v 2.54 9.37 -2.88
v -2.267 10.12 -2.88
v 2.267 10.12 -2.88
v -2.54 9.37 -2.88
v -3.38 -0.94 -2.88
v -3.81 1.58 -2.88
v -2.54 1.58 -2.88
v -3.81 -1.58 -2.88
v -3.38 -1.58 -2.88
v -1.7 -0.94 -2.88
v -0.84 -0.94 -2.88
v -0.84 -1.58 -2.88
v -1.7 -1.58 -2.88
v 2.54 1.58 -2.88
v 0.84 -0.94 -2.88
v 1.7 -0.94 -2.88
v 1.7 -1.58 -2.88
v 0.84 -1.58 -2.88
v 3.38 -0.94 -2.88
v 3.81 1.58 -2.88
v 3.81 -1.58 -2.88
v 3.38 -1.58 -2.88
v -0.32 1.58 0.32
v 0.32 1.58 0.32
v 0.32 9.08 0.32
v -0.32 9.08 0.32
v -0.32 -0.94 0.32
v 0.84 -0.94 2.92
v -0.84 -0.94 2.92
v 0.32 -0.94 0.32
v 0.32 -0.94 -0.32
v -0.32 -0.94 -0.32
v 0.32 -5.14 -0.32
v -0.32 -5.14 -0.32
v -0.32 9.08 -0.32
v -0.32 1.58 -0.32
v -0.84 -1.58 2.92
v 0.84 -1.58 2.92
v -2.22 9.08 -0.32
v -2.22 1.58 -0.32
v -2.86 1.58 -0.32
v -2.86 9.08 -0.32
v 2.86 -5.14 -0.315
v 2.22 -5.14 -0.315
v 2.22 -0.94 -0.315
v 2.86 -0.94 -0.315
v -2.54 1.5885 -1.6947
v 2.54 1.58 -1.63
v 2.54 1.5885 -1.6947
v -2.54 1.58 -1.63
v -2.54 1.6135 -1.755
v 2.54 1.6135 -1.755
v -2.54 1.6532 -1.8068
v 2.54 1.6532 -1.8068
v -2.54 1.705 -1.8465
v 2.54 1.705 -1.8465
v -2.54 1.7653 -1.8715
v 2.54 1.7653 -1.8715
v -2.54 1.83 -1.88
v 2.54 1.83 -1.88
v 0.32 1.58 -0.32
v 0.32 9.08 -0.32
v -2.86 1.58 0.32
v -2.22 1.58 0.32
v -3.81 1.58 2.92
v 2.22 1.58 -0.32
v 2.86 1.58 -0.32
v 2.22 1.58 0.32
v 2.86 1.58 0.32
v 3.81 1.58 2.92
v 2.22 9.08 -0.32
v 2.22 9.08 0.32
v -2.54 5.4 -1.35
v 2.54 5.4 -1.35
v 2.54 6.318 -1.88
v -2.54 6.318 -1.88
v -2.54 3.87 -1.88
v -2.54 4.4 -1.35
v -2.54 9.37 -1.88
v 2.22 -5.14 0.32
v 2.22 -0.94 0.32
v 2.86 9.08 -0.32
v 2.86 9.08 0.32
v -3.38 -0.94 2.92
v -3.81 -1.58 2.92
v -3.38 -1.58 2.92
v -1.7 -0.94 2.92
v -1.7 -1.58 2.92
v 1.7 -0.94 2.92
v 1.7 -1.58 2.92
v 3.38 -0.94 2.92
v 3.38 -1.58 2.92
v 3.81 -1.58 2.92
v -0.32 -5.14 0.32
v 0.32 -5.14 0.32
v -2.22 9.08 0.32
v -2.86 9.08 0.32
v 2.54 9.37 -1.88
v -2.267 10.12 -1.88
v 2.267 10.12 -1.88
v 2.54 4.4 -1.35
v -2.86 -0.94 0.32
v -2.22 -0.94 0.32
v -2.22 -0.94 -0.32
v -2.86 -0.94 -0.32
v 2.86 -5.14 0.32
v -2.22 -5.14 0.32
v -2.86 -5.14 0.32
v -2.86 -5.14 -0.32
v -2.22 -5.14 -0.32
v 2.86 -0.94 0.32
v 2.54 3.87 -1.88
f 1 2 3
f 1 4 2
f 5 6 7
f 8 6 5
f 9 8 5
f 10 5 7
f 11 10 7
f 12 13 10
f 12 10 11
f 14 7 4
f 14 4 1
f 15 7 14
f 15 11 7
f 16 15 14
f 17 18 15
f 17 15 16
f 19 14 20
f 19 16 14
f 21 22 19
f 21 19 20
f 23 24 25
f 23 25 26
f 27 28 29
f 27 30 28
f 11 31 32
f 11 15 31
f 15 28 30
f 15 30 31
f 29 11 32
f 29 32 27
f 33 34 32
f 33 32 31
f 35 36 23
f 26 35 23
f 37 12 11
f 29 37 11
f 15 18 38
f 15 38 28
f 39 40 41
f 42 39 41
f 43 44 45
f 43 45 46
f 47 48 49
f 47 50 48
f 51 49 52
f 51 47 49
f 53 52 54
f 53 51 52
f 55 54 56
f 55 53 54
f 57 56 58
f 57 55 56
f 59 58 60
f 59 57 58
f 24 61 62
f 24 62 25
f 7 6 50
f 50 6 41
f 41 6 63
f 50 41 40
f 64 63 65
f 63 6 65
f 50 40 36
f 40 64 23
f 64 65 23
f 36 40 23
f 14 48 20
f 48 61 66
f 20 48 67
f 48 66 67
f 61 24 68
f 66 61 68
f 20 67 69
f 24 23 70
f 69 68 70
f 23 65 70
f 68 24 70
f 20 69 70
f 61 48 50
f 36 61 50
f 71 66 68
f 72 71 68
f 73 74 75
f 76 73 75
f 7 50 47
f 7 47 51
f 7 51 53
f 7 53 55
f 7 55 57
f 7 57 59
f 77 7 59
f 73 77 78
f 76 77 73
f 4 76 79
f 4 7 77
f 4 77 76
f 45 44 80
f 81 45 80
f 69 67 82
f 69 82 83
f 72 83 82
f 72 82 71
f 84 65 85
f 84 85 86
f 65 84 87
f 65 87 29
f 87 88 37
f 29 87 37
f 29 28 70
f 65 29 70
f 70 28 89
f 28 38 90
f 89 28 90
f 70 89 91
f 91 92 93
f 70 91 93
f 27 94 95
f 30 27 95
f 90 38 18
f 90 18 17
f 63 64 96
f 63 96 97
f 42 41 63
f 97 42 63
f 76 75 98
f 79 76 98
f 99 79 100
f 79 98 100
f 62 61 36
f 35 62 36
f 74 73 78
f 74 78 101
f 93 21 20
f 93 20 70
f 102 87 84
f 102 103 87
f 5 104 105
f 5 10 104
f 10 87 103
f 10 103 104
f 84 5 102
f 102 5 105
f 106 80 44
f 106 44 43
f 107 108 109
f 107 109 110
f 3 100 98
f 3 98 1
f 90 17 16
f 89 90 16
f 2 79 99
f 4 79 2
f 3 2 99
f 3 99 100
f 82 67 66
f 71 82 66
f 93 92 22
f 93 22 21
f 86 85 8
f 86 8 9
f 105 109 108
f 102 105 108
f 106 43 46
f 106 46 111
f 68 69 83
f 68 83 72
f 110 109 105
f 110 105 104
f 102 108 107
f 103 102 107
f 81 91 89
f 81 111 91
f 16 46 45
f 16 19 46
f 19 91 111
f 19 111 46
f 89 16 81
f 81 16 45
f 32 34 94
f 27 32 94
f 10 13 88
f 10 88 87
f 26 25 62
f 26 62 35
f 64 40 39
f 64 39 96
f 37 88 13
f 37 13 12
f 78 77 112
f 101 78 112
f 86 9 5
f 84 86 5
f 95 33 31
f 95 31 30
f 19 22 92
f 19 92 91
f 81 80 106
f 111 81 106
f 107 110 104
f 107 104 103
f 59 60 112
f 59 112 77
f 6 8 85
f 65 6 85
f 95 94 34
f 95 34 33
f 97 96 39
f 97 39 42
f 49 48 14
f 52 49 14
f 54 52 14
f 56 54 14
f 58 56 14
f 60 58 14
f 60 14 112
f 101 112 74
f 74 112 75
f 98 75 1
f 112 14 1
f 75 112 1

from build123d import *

# Parameters (mm, degrees)
SKETCH1_W           = 7.62
SKETCH1_H           = 5.8
BOSS_EXTRUDE1_DEPTH = 3.16
SKETCH2_W           = 5.08
SKETCH2_H           = 1
BOSS_EXTRUDE2_DEPTH = 8.54
SKETCH3_W           = 5.08
SKETCH3_H           = 6.25
BOSS_EXTRUDE3_DEPTH = 0.53
SKETCH4_W           = 1.68
SKETCH4_H           = 0.64
CUT_EXTRUDE1_DEPTH  = 13.270717175
SKETCH5_W           = 1.68
SKETCH5_H           = 0.64
CUT_EXTRUDE2_DEPTH  = 13.270717175
SKETCH6_W           = 0.53
SKETCH6_H           = 3.802013072
CUT_EXTRUDE3_DEPTH  = 13.298914586
SKETCH7_W           = 1.68
SKETCH7_H           = 0.64
CUT_EXTRUDE4_DEPTH  = 13.270717175
SKETCH8_W           = 0.64
SKETCH8_H           = 0.64
BOSS_EXTRUDE4_DEPTH = 4.2
SKETCH9_W           = 0.64
SKETCH9_H           = 0.64
BOSS_EXTRUDE5_DEPTH = 4.2
SKETCH10_W          = 0.64
SKETCH10_H          = 0.635
BOSS_EXTRUDE6_DEPTH = 4.2
SKETCH11_W          = 0.64
SKETCH11_H          = 0.64
BOSS_EXTRUDE7_DEPTH = 7.5
SKETCH12_W          = 0.64
SKETCH12_H          = 0.64
BOSS_EXTRUDE8_DEPTH = 7.5
SKETCH13_W          = 0.64
SKETCH13_H          = 0.64
BOSS_EXTRUDE9_DEPTH = 7.5
DRAFT1_ANGLE        = 45
DRAFT2_ANGLE        = 60
CHAMFER1_SIZE       = 0.75
CHAMFER1_SIZE2      = 0.272977676
CHAMFER2_SIZE       = 0.272977676
CHAMFER2_SIZE2      = 0.75
FILLET1_R           = 0.25


with BuildPart() as part:
    # Sketch1 → Boss-Extrude1 (new body)
    with BuildSketch(Plane.XZ.offset(1.58)):
        with Locations((0, 0.02)):
            Rectangle(SKETCH1_W, SKETCH1_H)
    extrude(amount=-BOSS_EXTRUDE1_DEPTH)

    # Sketch2 → Boss-Extrude2 (add)
    with BuildSketch(Plane(origin=(0, 1.58, 0), x_dir=(-1, 0, 0), z_dir=(0, 1, 0))):
        with Locations((0, -2.38)):
            Rectangle(SKETCH2_W, SKETCH2_H)
    extrude(amount=BOSS_EXTRUDE2_DEPTH)

    # Sketch3 → Boss-Extrude3 (add)
    with BuildSketch(Plane.XY.offset(-1.88)):
        with Locations((0, 6.995)):
            Rectangle(SKETCH3_W, SKETCH3_H)
    extrude(amount=BOSS_EXTRUDE3_DEPTH)

    # Sketch4 → Cut-Extrude1 (cut, through all)
    with BuildSketch(Plane(origin=(0, 0, -2.88), x_dir=(-1, 0, 0), z_dir=(0, 0, -1))):
        with Locations((2.54, -1.26)):
            Rectangle(SKETCH4_W, SKETCH4_H)
    extrude(amount=-CUT_EXTRUDE1_DEPTH, mode=Mode.SUBTRACT)

    # Sketch5 → Cut-Extrude2 (cut, through all)
    with BuildSketch(Plane(origin=(0, 0, -2.88), x_dir=(-1, 0, 0), z_dir=(0, 0, -1))):
        with Locations((0, -1.26)):
            Rectangle(SKETCH5_W, SKETCH5_H)
    extrude(amount=-CUT_EXTRUDE2_DEPTH, mode=Mode.SUBTRACT)

    # Sketch6 → Cut-Extrude3 (cut, through all)
    with BuildSketch(Plane(origin=(2.54, 0, 0), x_dir=(0, 0, -1), z_dir=(1, 0, 0))):
        with Locations((1.615, 8.218993464)):
            Rectangle(SKETCH6_W, SKETCH6_H)
    extrude(amount=-CUT_EXTRUDE3_DEPTH, mode=Mode.SUBTRACT)

    # Sketch7 → Cut-Extrude4 (cut, through all)
    with BuildSketch(Plane(origin=(0, 0, -2.88), x_dir=(-1, 0, 0), z_dir=(0, 0, -1))):
        with Locations((-2.54, -1.26)):
            Rectangle(SKETCH7_W, SKETCH7_H)
    extrude(amount=-CUT_EXTRUDE4_DEPTH, mode=Mode.SUBTRACT)

    # Sketch8 → Boss-Extrude4 (add)
    with BuildSketch(Plane.XZ.offset(0.94)):
        Rectangle(SKETCH8_W, SKETCH8_H)
    extrude(amount=BOSS_EXTRUDE4_DEPTH)

    # Sketch9 → Boss-Extrude5 (add)
    with BuildSketch(Plane.XZ.offset(0.94)):
        with Locations((-2.54, 0)):
            Rectangle(SKETCH9_W, SKETCH9_H)
    extrude(amount=BOSS_EXTRUDE5_DEPTH)

    # Sketch10 → Boss-Extrude6 (add)
    with BuildSketch(Plane.XZ.offset(0.94)):
        with Locations((2.54, 0.0025)):
            Rectangle(SKETCH10_W, SKETCH10_H)
    extrude(amount=BOSS_EXTRUDE6_DEPTH)

    # Sketch11 → Boss-Extrude7 (add)
    with BuildSketch(Plane(origin=(0, 1.58, 0), x_dir=(-1, 0, 0), z_dir=(0, 1, 0))):
        Rectangle(SKETCH11_W, SKETCH11_H)
    extrude(amount=BOSS_EXTRUDE7_DEPTH)

    # Sketch12 → Boss-Extrude8 (add)
    with BuildSketch(Plane(origin=(0, 1.58, 0), x_dir=(-1, 0, 0), z_dir=(0, 1, 0))):
        with Locations((-2.54, 0)):
            Rectangle(SKETCH12_W, SKETCH12_H)
    extrude(amount=BOSS_EXTRUDE8_DEPTH)

    # Sketch13 → Boss-Extrude9 (add)
    with BuildSketch(Plane(origin=(0, 1.58, 0), x_dir=(-1, 0, 0), z_dir=(0, 1, 0))):
        with Locations((2.54, 0)):
            Rectangle(SKETCH13_W, SKETCH13_H)
    extrude(amount=BOSS_EXTRUDE9_DEPTH)

    # Draft1
    draft1_faces = [part.faces().sort_by_distance(p)[0] for p in [
        (0, 3.87, -1.615),
    ]]
    draft(draft1_faces, Plane(origin=(2.54, 10.12, -1.88), x_dir=(1, 0, 0), z_dir=(0, 0, 1)), DRAFT1_ANGLE)

    # Draft2
    draft2_faces = [part.faces().sort_by_distance(p)[0] for p in [
        (0, 6.317986928, -1.615),
    ]]
    draft(draft2_faces, Plane(origin=(-3.810025, 6.317986928, -1.88), x_dir=(1, 0, 0), z_dir=(0, 0, 1)), DRAFT2_ANGLE)

    # Chamfer1
    chamfer1_edges = [part.edges().sort_by_distance(p)[0] for p in [
        (2.54, 10.12, -2.38),
    ]]
    chamfer1_side = [part.faces().sort_by_distance(p)[0] for p in [
        (2.54, 5.768868228, -2.309646908),
    ]]
    chamfer(chamfer1_edges, length=CHAMFER1_SIZE, length2=CHAMFER1_SIZE2, reference=chamfer1_side[0])

    # Chamfer2
    chamfer2_edges = [part.edges().sort_by_distance(p)[0] for p in [
        (-2.54, 10.12, -2.38),
    ]]
    chamfer2_side = [part.faces().sort_by_distance(p)[0] for p in [
        (-0.136488838, 10.12, -2.38),
    ]]
    chamfer(chamfer2_edges, length=CHAMFER2_SIZE, length2=CHAMFER2_SIZE2, reference=chamfer2_side[0])

    # Fillet1
    fillet1_edges = [part.edges().sort_by_distance(p)[0] for p in [
        (0, 1.58, -1.88),
    ]]
    fillet(fillet1_edges, radius=FILLET1_R)


solid = part.part
